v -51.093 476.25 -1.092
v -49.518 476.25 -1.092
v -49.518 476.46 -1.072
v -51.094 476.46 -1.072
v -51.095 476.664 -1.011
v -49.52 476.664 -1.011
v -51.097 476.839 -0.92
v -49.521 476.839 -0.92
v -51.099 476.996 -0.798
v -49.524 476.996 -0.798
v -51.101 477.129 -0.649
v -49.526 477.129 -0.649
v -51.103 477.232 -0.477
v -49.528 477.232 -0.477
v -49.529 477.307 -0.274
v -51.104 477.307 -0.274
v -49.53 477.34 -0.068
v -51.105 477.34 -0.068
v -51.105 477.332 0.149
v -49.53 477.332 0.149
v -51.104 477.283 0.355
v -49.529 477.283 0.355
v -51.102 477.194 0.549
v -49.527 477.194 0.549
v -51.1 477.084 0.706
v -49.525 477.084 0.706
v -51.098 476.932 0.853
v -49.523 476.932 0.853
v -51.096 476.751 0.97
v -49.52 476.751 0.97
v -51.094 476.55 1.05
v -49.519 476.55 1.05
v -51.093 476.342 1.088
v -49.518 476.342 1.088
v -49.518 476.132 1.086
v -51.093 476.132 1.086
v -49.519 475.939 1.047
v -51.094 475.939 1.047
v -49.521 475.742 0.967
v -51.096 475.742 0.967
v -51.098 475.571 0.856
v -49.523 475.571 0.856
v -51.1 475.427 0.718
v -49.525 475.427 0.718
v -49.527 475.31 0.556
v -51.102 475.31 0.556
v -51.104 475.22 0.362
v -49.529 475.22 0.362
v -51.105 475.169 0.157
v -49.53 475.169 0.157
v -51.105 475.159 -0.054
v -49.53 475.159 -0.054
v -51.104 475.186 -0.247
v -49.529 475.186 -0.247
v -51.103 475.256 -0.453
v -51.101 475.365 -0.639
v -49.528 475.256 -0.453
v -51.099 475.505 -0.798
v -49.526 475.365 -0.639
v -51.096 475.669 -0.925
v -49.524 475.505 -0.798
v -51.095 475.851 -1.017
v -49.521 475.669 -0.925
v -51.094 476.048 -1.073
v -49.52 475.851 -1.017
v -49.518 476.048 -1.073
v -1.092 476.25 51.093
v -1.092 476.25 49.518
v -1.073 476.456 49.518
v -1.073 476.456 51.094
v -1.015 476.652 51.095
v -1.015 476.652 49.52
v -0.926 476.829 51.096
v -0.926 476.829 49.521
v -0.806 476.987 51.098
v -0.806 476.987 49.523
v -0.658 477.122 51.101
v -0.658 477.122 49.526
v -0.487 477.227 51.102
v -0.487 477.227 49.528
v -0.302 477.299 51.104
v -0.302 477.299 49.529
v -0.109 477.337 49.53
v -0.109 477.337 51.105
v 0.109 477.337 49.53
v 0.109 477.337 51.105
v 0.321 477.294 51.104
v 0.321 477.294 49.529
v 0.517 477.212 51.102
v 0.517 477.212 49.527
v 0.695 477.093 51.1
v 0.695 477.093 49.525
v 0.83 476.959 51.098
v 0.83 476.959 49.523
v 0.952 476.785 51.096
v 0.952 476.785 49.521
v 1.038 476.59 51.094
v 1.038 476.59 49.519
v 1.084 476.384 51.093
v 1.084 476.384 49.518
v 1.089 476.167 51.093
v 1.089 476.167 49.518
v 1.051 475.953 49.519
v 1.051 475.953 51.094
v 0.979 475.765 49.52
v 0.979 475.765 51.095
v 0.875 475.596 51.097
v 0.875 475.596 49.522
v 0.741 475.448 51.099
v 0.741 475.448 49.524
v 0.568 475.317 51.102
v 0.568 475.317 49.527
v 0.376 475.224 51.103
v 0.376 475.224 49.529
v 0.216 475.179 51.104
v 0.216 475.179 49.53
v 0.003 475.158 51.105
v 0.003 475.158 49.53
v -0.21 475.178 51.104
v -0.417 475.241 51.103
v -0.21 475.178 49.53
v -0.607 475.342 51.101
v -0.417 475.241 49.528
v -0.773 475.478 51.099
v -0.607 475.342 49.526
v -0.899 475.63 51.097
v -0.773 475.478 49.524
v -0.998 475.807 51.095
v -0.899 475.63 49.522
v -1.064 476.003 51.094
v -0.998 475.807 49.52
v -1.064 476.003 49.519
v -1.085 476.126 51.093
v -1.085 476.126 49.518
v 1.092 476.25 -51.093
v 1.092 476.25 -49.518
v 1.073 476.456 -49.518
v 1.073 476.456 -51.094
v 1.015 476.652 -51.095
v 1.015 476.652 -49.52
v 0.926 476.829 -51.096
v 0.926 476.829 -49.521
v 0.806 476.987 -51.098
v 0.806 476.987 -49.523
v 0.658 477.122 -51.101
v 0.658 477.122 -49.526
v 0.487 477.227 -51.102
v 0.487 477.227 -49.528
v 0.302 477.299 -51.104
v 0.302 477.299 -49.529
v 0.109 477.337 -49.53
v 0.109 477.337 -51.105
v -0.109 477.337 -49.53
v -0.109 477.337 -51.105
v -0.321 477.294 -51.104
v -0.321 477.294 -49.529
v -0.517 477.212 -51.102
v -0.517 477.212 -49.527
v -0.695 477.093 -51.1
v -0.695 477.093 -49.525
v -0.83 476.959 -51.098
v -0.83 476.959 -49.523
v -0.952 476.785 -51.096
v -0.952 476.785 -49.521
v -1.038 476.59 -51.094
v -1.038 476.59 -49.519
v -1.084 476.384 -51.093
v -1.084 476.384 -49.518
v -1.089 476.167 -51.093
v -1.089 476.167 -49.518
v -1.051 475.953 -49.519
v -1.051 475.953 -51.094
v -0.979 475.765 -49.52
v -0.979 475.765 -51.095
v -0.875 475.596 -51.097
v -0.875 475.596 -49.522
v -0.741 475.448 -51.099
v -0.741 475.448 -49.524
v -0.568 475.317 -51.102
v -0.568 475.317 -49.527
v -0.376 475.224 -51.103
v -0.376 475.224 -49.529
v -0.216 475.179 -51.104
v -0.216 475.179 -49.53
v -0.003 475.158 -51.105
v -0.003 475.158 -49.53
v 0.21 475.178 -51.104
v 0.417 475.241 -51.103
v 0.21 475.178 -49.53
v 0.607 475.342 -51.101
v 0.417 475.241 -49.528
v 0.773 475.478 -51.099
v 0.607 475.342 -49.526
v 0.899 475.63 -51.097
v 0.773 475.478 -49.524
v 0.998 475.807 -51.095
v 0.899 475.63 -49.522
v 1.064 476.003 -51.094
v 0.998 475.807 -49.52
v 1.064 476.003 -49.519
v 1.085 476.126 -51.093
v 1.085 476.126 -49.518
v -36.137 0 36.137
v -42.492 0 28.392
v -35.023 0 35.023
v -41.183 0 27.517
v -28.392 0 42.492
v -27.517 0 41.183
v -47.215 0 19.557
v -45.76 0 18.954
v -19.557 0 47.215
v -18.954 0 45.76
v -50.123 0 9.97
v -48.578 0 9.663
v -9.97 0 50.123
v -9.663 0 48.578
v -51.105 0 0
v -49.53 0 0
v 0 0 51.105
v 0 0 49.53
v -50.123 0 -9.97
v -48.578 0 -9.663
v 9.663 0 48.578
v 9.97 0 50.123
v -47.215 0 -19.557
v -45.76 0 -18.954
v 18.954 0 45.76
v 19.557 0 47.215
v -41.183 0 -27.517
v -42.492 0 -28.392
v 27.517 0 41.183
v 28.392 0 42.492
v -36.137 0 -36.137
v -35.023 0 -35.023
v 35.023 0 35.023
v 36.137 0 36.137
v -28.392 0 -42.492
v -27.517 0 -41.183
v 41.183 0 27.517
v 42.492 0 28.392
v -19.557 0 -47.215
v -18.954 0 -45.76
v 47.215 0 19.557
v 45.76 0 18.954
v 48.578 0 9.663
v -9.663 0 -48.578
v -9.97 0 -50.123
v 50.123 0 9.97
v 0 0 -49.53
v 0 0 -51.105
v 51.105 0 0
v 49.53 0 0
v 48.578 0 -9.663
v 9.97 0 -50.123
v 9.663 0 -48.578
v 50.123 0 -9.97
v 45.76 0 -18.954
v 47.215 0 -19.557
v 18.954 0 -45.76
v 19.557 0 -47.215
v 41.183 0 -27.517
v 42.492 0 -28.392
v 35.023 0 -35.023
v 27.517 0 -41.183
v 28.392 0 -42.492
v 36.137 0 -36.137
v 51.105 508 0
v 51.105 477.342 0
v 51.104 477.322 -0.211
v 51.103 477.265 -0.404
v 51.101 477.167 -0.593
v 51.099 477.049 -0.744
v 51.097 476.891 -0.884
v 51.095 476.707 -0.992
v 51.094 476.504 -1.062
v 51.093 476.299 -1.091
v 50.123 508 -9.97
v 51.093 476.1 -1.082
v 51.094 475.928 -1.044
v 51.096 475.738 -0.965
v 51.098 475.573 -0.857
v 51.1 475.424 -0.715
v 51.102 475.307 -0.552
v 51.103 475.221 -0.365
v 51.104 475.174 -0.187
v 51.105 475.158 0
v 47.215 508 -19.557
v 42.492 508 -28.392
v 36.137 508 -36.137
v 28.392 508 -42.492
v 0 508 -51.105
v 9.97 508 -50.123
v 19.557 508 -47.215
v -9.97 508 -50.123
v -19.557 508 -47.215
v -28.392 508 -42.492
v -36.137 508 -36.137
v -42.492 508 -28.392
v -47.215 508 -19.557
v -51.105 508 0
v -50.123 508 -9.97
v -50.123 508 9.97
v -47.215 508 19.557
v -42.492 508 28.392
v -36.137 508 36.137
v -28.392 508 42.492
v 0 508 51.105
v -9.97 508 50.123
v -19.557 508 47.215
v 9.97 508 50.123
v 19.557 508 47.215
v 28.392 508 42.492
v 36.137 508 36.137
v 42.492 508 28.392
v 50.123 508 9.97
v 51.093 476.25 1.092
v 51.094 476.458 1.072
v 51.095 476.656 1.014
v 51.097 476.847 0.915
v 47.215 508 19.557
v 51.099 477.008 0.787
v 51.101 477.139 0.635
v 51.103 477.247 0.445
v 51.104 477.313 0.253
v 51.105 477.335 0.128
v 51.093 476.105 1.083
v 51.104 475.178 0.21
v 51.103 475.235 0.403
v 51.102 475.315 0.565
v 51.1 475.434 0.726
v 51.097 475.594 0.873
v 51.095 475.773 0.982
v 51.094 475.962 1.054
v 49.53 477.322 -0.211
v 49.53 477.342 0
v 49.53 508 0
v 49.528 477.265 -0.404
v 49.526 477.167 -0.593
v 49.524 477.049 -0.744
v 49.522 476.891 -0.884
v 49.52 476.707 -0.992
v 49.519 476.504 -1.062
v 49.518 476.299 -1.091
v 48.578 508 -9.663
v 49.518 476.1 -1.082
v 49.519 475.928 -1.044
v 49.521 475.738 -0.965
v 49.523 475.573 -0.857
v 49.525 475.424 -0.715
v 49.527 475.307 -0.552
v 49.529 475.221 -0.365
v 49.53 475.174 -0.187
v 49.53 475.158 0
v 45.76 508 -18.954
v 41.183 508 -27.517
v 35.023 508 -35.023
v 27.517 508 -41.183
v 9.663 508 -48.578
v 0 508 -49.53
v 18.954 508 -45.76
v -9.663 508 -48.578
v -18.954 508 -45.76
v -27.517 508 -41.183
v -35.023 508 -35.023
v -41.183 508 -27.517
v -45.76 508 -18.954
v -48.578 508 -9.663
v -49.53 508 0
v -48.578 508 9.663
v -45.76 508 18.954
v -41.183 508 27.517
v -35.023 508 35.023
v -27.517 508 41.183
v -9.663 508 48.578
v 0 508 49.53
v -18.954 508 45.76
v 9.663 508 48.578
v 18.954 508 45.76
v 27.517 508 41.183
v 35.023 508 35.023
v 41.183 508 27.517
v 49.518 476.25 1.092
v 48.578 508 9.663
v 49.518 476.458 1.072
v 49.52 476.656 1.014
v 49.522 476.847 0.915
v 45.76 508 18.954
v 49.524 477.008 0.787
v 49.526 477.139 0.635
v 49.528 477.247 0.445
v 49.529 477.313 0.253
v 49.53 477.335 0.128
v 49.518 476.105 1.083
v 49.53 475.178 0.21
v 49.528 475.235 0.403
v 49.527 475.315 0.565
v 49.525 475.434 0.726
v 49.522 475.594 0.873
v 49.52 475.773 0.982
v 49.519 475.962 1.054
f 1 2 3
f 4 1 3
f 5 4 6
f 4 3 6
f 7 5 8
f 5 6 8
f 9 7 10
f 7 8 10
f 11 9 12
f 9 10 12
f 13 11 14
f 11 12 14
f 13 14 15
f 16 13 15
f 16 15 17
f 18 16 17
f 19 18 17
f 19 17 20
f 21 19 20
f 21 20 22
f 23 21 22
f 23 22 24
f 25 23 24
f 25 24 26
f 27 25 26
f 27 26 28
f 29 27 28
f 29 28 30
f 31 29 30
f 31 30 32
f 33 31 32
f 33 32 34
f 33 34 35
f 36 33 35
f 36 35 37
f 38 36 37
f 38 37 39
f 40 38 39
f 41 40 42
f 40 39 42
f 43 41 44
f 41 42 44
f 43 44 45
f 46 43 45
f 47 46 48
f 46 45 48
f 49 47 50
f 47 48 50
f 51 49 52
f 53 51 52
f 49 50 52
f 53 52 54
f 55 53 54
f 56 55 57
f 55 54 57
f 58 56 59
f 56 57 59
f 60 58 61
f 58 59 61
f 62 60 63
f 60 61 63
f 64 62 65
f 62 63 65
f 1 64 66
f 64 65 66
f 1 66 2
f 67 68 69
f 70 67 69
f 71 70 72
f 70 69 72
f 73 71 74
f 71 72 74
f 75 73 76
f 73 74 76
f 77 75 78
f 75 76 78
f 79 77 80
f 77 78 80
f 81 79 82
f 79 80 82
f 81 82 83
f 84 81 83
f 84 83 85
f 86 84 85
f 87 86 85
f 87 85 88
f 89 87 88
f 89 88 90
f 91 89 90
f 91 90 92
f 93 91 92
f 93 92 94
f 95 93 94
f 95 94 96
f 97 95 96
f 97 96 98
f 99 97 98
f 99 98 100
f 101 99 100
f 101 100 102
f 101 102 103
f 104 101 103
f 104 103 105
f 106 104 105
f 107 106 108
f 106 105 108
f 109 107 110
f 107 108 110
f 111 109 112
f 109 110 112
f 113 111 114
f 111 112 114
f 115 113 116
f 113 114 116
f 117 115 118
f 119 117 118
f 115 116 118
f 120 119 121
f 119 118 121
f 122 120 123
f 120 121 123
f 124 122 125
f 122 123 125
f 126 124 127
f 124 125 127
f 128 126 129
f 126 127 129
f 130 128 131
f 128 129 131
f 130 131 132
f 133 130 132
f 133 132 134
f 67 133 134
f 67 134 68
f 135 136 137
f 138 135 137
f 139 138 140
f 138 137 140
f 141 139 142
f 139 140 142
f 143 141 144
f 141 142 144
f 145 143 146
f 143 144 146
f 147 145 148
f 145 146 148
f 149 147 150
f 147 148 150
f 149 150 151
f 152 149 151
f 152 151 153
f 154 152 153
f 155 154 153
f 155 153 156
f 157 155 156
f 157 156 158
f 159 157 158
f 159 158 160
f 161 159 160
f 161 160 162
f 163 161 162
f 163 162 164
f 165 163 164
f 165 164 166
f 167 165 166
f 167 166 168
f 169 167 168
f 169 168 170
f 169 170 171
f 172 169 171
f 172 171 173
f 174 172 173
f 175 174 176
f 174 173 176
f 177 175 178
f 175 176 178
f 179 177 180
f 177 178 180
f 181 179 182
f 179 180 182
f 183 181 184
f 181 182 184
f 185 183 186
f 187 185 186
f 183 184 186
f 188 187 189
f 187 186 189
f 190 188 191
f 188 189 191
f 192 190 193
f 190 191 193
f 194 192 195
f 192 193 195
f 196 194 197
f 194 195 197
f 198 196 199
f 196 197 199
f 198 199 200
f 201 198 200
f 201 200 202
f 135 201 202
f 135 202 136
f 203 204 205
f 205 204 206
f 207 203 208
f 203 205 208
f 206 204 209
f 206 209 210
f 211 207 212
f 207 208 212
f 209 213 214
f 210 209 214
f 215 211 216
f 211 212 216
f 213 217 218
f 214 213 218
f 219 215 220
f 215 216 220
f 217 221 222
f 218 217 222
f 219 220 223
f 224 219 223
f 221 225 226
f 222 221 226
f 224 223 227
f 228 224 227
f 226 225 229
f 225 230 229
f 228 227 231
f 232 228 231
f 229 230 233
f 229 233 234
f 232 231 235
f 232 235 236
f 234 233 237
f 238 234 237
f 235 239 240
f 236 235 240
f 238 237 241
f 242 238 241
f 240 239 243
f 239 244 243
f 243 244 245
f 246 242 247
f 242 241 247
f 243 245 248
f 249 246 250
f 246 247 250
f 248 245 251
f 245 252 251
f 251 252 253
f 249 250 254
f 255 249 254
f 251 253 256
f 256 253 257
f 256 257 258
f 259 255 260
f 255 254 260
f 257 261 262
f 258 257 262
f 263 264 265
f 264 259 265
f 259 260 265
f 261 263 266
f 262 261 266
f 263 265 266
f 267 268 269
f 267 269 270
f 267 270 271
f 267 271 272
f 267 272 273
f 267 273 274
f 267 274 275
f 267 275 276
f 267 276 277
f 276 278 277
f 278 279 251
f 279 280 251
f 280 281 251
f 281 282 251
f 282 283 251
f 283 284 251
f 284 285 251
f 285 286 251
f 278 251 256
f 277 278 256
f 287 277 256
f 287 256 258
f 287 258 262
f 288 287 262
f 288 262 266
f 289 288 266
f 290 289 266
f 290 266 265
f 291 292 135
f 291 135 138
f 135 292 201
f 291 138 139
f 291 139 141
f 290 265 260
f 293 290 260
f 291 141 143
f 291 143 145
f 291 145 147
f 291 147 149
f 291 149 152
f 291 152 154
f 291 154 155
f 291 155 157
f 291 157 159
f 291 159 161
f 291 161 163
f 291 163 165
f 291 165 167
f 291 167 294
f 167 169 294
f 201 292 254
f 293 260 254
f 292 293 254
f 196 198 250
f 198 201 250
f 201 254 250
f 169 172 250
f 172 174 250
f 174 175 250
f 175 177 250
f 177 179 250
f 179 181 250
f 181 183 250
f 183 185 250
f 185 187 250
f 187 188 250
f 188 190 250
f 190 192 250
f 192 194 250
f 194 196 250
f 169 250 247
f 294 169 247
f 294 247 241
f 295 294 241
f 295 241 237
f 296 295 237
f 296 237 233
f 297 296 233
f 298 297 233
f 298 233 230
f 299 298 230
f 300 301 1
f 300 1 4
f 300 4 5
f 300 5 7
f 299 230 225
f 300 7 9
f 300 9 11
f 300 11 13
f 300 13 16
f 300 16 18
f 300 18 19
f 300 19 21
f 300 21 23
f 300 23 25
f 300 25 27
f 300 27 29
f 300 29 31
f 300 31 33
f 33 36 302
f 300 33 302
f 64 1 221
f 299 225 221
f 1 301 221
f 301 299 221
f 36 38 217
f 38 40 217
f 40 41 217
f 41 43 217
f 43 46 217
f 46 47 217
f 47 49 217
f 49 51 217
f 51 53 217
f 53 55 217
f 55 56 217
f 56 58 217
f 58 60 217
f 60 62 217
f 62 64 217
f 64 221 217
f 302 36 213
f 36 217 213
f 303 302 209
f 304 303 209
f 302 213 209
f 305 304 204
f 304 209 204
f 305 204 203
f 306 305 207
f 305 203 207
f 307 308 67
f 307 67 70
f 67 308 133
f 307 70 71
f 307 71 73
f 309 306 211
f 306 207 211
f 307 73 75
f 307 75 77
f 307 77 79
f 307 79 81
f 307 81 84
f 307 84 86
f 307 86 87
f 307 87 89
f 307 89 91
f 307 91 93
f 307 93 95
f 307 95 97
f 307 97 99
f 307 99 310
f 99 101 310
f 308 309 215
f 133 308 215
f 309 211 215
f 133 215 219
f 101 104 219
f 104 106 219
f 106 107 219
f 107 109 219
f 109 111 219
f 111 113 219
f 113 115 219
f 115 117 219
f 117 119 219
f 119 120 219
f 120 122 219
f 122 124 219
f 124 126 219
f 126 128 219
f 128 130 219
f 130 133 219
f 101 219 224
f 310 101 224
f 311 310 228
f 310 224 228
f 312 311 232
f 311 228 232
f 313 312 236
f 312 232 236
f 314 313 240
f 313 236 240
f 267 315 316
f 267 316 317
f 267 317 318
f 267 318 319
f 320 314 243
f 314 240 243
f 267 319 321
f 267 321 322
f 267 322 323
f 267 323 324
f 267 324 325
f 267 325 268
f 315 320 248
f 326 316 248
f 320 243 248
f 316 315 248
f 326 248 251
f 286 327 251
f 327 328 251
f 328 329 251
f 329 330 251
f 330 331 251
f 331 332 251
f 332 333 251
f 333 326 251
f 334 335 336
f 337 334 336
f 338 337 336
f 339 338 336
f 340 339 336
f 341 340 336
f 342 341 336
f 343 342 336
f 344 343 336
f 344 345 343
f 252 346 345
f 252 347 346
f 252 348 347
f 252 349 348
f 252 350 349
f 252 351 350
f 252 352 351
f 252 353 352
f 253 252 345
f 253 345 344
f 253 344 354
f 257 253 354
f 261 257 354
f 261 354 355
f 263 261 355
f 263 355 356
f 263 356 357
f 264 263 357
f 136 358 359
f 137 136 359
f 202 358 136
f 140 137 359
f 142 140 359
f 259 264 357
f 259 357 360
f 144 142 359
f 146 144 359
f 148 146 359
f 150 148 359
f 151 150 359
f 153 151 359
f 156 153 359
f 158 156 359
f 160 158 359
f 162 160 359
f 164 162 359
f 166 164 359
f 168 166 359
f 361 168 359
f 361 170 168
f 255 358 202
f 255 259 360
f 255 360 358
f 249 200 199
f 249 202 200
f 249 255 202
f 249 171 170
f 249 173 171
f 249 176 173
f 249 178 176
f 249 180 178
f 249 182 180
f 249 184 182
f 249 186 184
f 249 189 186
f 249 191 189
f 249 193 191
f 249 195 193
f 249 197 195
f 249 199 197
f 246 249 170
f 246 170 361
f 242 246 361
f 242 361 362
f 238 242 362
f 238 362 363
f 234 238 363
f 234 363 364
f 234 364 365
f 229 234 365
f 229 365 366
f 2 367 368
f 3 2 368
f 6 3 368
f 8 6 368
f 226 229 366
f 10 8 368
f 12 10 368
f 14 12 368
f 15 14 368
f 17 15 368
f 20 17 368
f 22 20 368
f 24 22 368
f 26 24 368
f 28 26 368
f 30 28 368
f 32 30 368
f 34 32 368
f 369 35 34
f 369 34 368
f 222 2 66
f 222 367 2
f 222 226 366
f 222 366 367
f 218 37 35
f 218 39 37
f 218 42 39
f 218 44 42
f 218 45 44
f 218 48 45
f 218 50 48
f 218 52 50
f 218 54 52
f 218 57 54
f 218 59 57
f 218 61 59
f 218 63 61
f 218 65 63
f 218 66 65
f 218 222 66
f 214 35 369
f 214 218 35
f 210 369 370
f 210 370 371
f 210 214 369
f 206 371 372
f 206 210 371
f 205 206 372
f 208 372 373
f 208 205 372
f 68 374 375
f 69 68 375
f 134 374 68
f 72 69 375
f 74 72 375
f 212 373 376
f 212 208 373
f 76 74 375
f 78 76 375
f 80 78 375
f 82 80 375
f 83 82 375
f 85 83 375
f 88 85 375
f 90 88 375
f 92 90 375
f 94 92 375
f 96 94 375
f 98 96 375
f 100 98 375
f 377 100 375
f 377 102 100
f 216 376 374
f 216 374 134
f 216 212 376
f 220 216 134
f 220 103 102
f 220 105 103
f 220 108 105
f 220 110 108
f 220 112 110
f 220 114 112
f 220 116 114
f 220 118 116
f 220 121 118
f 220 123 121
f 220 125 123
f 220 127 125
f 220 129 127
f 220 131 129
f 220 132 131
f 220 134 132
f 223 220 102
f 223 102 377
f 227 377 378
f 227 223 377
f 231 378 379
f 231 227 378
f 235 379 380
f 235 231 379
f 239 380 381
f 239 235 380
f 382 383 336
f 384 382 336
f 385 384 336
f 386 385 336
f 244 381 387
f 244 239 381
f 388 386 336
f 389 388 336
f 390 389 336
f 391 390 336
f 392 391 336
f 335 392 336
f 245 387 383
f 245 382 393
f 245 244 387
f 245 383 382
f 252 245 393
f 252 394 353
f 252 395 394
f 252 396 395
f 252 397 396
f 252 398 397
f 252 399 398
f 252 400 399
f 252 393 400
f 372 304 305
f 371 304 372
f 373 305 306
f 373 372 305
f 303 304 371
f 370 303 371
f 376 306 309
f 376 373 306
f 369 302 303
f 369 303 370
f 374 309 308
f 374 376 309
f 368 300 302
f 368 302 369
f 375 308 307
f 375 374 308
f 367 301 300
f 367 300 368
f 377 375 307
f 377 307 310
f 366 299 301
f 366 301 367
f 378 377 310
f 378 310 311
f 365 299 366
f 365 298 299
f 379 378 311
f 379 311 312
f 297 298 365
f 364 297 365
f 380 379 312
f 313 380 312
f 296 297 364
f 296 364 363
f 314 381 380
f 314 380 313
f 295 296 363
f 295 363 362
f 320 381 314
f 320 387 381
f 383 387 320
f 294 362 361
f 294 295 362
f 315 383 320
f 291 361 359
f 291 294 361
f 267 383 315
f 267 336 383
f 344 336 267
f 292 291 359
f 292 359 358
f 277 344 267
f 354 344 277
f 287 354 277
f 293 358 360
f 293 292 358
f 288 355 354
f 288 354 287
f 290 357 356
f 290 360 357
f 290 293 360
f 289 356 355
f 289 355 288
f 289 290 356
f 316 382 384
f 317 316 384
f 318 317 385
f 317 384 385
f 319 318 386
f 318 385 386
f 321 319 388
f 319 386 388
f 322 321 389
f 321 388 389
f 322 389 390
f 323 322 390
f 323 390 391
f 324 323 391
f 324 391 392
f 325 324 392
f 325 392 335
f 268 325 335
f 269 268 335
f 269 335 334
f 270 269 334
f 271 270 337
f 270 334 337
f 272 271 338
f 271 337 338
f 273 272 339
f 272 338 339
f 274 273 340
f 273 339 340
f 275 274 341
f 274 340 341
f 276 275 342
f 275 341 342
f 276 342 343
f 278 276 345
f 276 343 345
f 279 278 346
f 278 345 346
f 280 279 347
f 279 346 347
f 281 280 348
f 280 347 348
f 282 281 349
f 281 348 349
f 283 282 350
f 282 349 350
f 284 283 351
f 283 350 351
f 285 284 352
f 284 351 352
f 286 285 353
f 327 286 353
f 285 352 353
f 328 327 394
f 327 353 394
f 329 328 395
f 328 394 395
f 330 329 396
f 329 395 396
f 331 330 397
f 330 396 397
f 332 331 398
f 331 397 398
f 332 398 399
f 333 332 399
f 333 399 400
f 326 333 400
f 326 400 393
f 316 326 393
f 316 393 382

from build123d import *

# Parameters (mm, degrees)
SKETCH1_R           = 51.1048
SKETCH1_R_2         = 49.53
BOSS_EXTRUDE1_DEPTH = 508
SKETCH2_R           = 1.0922
CUT_EXTRUDE1_DEPTH  = 52.1048
CIRPATTERN2_COUNT   = 4


with BuildPart() as part:
    # Sketch1 → Boss-Extrude1 (new body)
    with BuildSketch(Plane(origin=(0, 0, 0), x_dir=(1, 0, 0), z_dir=(0, 1, 0))):
        Circle(SKETCH1_R)
        Circle(SKETCH1_R_2, mode=Mode.SUBTRACT)
    extrude(amount=BOSS_EXTRUDE1_DEPTH)

    # Sketch2 → Cut-Extrude1 (cut, through all)
    with BuildSketch(Plane.XY):
        with Locations((0, 476.25)):
            Circle(SKETCH2_R)
    cut_extrude1 = extrude(amount=-CUT_EXTRUDE1_DEPTH, mode=Mode.SUBTRACT)

    # CirPattern2: Cut-Extrude1 ×4 about axis
    cirpattern2_axis = Axis((0, 508, 0), (0, -1, 0))
    for i in range(1, CIRPATTERN2_COUNT):
        add(cut_extrude1.rotate(cirpattern2_axis, i * 360 / CIRPATTERN2_COUNT), mode=Mode.SUBTRACT)


solid = part.part
